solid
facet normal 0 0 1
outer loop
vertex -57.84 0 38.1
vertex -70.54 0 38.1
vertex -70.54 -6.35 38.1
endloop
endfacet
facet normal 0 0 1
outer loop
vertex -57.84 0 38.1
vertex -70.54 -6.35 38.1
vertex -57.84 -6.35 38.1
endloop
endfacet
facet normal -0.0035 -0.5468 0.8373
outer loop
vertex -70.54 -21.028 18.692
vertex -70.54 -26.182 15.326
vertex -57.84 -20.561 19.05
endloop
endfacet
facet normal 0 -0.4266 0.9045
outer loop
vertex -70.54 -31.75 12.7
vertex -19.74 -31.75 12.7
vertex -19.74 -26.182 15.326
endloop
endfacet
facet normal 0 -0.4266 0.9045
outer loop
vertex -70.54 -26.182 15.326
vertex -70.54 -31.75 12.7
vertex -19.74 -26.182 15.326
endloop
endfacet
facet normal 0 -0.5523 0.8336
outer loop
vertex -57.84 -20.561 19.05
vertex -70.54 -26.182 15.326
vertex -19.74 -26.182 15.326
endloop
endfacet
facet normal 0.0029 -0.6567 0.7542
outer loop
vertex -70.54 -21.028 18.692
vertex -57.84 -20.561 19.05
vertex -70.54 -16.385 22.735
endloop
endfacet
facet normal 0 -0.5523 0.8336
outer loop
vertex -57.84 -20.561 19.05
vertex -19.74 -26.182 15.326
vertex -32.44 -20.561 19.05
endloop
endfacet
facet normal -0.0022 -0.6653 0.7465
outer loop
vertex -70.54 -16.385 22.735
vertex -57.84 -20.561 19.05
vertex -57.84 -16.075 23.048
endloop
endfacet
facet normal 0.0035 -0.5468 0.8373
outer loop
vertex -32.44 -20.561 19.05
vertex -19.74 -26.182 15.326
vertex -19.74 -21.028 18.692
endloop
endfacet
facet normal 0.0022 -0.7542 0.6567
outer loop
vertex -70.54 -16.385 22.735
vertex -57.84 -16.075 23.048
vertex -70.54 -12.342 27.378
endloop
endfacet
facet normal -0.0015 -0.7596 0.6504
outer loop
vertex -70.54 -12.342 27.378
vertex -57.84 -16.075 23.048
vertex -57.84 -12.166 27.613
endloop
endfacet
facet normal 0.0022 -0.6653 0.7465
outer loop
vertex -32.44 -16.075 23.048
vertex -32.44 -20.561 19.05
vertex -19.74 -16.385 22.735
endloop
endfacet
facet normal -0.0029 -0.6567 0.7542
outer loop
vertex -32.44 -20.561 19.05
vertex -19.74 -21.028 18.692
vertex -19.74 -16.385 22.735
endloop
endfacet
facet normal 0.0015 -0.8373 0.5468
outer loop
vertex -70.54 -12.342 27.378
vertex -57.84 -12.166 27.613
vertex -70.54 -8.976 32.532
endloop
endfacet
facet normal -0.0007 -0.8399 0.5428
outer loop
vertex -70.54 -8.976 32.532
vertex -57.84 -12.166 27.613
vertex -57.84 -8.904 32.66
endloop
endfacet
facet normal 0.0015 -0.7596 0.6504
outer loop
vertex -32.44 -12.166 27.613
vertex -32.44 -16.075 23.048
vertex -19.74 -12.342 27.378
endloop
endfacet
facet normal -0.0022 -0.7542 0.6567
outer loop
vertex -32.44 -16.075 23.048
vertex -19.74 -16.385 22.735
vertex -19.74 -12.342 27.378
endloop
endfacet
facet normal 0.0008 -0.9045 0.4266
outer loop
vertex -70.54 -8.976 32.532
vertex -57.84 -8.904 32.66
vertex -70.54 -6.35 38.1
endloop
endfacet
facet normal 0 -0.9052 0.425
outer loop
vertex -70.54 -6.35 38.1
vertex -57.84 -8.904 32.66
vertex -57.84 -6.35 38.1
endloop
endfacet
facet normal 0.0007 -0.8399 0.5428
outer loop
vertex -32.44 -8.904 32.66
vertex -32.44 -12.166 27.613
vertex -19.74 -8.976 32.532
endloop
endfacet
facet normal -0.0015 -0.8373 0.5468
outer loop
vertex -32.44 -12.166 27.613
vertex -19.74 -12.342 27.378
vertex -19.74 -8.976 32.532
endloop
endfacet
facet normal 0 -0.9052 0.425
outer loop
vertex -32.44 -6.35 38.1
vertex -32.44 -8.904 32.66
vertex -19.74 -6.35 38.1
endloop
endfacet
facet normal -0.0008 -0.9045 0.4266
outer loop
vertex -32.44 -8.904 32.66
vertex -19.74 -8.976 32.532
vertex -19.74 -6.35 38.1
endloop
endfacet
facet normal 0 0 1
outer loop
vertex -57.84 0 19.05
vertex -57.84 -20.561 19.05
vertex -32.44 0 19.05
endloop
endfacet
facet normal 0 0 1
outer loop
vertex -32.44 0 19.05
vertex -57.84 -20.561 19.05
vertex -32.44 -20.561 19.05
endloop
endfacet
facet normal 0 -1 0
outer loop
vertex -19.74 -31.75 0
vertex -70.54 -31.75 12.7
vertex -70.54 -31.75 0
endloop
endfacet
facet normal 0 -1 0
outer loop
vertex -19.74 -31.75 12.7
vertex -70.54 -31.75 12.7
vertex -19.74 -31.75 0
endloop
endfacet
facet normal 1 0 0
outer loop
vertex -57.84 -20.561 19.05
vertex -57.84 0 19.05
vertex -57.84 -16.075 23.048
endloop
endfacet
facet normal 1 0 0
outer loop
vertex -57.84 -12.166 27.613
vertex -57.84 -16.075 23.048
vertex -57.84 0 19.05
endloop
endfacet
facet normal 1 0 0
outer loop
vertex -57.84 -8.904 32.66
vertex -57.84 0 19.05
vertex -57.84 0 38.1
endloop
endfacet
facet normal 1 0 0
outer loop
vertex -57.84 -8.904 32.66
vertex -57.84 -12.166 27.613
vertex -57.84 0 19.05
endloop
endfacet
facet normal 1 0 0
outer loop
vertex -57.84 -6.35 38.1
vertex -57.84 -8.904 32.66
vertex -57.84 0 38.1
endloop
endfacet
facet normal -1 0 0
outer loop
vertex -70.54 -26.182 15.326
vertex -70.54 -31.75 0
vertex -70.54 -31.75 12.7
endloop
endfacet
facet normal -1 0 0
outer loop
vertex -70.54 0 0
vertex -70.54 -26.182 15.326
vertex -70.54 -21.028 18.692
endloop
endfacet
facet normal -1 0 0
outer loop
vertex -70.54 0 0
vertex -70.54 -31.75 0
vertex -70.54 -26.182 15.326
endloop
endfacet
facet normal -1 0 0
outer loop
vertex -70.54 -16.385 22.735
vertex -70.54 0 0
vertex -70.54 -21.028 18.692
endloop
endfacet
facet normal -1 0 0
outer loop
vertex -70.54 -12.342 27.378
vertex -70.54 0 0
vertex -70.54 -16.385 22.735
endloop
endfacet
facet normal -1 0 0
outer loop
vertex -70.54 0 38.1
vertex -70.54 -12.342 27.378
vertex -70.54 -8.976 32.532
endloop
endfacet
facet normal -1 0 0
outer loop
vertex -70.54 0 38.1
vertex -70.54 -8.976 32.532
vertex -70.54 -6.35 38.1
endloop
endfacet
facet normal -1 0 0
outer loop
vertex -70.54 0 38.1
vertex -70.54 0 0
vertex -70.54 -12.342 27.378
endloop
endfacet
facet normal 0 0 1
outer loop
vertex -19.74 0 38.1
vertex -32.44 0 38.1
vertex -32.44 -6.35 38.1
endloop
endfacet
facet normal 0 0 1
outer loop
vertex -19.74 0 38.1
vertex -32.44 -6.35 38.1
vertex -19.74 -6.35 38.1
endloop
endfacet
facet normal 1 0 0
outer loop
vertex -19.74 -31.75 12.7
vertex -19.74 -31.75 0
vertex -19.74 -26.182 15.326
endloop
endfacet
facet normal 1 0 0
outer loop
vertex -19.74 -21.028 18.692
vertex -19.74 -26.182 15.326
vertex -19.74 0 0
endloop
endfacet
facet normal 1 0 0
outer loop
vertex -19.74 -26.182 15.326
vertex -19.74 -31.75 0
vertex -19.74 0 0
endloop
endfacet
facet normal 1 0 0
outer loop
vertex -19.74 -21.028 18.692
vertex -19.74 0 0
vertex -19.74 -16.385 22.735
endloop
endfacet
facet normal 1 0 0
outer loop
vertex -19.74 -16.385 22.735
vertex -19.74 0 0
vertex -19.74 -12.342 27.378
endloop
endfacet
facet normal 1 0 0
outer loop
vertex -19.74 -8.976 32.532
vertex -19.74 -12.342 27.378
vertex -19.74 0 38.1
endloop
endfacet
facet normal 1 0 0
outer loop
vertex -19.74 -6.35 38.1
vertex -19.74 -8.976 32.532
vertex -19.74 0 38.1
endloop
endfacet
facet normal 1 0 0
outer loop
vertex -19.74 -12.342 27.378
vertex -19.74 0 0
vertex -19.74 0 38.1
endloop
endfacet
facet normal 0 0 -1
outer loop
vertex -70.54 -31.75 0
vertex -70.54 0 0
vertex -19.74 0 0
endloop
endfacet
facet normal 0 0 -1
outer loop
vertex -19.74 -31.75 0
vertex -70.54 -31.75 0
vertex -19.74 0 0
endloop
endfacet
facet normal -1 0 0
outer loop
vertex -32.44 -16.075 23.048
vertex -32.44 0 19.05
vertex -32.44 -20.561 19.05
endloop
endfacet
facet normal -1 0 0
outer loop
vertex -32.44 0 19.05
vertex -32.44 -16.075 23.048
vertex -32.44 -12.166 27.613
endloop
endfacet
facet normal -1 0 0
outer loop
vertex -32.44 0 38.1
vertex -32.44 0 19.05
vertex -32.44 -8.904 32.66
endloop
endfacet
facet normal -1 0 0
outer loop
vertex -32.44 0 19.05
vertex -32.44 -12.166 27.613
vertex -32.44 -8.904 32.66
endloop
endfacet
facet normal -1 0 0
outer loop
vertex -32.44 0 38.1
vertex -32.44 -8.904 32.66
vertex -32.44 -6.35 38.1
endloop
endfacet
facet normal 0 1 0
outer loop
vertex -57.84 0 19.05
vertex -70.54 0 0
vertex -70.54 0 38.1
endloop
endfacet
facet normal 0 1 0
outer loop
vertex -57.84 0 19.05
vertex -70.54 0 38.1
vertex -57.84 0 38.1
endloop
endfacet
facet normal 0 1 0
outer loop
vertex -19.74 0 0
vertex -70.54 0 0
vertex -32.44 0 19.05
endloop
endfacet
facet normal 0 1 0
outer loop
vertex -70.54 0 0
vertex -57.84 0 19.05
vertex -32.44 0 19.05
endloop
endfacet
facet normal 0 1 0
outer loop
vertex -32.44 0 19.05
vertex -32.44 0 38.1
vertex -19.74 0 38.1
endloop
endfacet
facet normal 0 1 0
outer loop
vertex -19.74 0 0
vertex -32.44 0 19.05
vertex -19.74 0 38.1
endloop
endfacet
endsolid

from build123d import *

# Parameters (mm, degrees)
F0_W     = 50.8
F0_H     = 38.1
F1_DEPTH = 31.75
F2_W     = 25.4
F2_H     = 19.05
F3_DEPTH = 19.05
F4_DEPTH = 25.4
F6_DEPTH = 50.8


with BuildPart() as f1:
    # F0 (on Front) → F1 (new body)
    with BuildSketch(Plane.XZ):
        with Locations((-45.1402231145, 19.05)):
            Rectangle(F0_W, F0_H)
    extrude(amount=F1_DEPTH)

    # F2 (on face) → F3 (cut)
    with BuildSketch(Plane.XZ.offset(31.75)):
        with Locations((-45.1402231145, 28.575)):
            Rectangle(F2_W, F2_H)
    extrude(amount=-F3_DEPTH, mode=Mode.SUBTRACT)

    # F4 (cut): a face of the model
    f4_faces = [f1.faces().sort_by_distance(p)[0] for p in [
        (-45.1402231145, -12.7, 28.575),
    ]]
    extrude(f4_faces, amount=-F4_DEPTH, mode=Mode.SUBTRACT)

    # F5 (on face) → F6 (cut)
    with BuildSketch(Plane.YZ.offset(-19.7402231145)):
        with BuildLine():
            ThreePointArc((-31.75, 12.7), (-16.3850971413, 22.7350971413), (-6.35, 38.1))
            Line((-6.35, 38.1), (-31.75, 38.1))
            Line((-31.75, 38.1), (-31.75, 12.7))
        make_face()
    extrude(amount=-F6_DEPTH, mode=Mode.SUBTRACT)


solid = f1.part
